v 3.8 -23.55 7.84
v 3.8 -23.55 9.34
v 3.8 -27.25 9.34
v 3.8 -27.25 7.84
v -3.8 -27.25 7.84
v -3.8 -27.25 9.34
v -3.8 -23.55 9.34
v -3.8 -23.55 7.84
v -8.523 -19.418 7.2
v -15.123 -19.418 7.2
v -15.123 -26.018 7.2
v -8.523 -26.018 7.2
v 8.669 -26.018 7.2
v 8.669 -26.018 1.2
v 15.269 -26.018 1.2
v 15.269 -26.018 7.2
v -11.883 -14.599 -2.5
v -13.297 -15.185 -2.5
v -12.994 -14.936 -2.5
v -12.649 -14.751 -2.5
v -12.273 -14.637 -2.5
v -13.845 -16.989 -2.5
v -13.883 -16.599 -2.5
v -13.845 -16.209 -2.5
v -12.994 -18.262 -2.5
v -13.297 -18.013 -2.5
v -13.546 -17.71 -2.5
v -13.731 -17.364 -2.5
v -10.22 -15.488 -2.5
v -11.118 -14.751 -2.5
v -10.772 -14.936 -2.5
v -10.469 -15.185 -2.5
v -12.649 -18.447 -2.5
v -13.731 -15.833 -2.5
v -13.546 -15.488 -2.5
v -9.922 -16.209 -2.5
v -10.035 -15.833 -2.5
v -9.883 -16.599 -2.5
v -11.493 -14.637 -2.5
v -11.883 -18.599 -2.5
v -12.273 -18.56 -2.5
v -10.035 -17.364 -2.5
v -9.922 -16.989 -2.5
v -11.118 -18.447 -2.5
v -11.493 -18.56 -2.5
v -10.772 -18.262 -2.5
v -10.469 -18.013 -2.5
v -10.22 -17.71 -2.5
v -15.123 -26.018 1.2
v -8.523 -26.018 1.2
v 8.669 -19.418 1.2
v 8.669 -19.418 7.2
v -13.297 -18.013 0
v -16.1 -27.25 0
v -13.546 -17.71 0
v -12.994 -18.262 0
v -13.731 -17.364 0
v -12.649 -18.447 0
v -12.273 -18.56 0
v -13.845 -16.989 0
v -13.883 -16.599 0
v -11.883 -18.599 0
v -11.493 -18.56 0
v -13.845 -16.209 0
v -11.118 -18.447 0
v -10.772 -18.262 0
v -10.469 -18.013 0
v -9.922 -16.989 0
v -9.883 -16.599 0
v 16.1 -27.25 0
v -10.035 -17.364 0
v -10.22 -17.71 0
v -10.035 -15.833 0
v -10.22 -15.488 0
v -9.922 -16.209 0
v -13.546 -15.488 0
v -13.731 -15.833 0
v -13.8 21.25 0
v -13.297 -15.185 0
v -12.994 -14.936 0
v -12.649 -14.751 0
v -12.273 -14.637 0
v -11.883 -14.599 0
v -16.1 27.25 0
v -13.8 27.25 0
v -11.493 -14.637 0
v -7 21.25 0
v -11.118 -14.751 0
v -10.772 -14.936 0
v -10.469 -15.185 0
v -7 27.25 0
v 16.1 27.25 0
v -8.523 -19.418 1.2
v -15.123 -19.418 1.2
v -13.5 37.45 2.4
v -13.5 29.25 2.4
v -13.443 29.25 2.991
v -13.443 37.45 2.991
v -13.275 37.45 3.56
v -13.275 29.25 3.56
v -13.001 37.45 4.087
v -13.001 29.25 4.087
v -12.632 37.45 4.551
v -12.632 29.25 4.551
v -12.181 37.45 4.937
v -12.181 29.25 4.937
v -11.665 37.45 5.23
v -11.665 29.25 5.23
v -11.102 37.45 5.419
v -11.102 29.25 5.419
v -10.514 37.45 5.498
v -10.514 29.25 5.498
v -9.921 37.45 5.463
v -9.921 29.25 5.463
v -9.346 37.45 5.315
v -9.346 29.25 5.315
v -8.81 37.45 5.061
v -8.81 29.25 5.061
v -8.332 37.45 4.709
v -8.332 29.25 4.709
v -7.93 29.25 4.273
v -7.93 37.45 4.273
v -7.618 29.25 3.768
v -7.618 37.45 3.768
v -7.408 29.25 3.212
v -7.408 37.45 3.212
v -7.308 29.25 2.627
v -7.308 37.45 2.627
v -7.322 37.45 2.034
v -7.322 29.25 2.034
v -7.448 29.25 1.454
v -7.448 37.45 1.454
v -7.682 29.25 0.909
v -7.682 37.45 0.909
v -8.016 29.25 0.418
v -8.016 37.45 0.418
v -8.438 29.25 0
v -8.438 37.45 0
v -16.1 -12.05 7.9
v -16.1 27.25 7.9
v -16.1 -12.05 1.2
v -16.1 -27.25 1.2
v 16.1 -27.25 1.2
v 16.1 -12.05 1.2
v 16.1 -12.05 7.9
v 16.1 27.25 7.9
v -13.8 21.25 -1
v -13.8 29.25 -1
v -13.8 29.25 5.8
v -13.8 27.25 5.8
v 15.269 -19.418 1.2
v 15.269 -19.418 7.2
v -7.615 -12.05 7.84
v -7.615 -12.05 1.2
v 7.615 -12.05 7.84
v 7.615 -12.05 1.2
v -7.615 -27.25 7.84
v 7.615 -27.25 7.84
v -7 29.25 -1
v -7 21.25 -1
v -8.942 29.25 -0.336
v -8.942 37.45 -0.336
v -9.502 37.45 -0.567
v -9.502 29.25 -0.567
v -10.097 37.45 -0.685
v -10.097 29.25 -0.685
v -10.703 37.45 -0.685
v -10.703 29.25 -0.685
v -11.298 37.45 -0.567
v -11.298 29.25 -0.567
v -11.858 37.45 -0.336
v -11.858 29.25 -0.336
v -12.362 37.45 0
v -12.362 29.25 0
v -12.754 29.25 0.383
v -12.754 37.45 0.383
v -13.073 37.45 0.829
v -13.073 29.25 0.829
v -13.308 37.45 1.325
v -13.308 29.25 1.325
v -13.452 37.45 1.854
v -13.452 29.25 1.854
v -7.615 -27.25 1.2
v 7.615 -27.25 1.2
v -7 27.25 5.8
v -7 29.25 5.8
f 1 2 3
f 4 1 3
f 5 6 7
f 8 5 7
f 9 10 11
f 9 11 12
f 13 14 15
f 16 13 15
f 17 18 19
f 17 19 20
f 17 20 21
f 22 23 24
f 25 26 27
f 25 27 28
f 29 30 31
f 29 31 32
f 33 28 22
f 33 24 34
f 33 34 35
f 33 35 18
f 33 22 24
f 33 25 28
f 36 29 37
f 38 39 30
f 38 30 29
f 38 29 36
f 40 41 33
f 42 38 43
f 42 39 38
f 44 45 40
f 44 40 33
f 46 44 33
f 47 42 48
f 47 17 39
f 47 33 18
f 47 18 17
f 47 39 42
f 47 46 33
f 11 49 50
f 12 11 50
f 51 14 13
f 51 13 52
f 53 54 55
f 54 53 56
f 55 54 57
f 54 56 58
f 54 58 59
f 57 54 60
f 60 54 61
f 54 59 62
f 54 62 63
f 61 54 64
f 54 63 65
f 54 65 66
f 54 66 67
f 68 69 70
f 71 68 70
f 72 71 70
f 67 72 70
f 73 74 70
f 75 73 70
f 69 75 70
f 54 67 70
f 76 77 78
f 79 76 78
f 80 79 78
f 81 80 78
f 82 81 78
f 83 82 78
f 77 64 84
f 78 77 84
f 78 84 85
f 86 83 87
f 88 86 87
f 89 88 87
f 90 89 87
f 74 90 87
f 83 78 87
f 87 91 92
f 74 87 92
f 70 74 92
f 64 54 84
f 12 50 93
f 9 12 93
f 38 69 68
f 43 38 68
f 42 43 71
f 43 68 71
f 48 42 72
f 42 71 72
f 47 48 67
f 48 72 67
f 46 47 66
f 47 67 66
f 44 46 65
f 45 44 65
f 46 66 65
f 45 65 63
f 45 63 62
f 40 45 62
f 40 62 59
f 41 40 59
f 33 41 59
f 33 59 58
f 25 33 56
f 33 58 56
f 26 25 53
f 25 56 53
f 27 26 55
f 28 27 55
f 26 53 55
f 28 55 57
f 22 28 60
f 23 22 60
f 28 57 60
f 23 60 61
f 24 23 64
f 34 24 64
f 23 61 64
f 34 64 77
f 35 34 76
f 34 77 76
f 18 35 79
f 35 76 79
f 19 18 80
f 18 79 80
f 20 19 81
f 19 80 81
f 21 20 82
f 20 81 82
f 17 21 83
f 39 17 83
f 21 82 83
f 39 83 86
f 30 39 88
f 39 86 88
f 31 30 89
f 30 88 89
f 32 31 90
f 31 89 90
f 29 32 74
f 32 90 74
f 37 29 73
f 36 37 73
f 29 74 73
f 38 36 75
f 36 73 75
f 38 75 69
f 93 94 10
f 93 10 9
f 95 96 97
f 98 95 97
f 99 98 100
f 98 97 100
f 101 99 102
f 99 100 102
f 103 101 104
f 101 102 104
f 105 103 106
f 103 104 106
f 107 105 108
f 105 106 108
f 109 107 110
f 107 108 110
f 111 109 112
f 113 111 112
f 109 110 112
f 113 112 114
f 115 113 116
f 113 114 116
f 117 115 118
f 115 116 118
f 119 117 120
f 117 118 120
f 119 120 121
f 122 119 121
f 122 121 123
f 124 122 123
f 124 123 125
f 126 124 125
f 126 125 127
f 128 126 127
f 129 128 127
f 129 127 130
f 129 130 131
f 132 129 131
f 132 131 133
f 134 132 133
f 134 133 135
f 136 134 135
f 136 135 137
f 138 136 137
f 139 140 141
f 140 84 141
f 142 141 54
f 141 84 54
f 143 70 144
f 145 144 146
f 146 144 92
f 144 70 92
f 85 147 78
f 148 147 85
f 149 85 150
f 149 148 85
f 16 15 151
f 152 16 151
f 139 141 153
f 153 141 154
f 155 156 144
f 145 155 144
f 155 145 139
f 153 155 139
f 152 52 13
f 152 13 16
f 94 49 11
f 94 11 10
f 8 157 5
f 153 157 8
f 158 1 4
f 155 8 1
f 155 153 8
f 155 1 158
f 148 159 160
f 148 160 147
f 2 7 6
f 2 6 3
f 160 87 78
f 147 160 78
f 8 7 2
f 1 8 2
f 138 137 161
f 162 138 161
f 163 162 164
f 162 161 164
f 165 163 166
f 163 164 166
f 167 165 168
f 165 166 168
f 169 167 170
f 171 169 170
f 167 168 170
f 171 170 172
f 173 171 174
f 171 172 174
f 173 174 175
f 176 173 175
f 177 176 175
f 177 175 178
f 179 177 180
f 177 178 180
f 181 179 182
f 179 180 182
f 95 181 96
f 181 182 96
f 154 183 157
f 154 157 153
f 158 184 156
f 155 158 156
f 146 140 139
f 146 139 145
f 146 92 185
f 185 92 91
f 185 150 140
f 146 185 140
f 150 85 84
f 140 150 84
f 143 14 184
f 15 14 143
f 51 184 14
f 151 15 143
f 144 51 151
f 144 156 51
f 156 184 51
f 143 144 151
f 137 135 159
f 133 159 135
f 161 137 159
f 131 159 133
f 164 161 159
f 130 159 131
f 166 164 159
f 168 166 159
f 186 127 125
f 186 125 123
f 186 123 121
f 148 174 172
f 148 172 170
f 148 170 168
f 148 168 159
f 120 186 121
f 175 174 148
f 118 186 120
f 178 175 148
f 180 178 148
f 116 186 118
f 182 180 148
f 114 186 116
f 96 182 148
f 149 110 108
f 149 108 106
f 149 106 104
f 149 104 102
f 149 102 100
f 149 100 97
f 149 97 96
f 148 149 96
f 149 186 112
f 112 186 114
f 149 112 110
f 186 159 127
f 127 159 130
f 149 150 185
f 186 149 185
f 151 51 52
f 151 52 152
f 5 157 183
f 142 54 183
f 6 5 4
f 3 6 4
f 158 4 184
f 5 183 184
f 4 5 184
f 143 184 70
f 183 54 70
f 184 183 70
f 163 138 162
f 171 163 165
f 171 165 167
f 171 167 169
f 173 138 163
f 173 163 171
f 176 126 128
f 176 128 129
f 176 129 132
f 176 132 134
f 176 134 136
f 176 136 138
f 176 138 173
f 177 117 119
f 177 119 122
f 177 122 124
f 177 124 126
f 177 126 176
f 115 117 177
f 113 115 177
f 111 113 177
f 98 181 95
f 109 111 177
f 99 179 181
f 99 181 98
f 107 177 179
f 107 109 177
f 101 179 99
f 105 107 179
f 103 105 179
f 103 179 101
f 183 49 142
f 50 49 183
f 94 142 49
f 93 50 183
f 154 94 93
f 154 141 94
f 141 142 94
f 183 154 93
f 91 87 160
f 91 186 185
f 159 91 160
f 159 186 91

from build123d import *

# Parameters (mm, degrees)
F0_W      = 32.2
F0_H      = 54.5
F1_DEPTH  = 1.2
F3_DEPTH  = 6.7
F2_W      = 15.23
F2_H      = 15.2
F4_DEPTH  = 8.14
F2_W_2    = 6.6
F2_H_2    = 6.6
F5_DEPTH  = 6
F6_R      = 2
F7_DEPTH  = 2.5
F9_DEPTH  = 10.2
F10_DEPTH = 2
F11_DEPTH = 6
F13_DEPTH = 1.5


with BuildPart() as f1:
    # F0 (on Top) → F1 (new body)
    with BuildSketch(Plane.XY):
        Rectangle(F0_W, F0_H)
    extrude(amount=F1_DEPTH)

    # F2 (on face) → F3 (join)
    with BuildSketch(Plane.XY.offset(1.2)):
        Polygon((-7.615, -12.05), (7.615, -12.05), (16.1, -12.05), (16.1, 27.25), (-16.1, 27.25), (-16.1, -12.05), align=None)
    extrude(amount=F3_DEPTH)

    # F2 (on face) → F4 (join)
    with BuildSketch(Plane.XY.offset(1.2)):
        with Locations((0, -19.65)):
            Rectangle(F2_W, F2_H)
    extrude(amount=F4_DEPTH)

    # F2 (on face) → F5 (join)
    with BuildSketch(Plane.XY.offset(1.2)):
        with Locations((-11.8228513747, -22.7176826447)):
            Rectangle(F2_W_2, F2_H_2)
        with Locations((11.9689786807, -22.7176826447)):
            Rectangle(F2_W_2, F2_H_2)
    extrude(amount=F5_DEPTH)

    # F6 (on face) → F7 (join)
    with BuildSketch(Plane(origin=(0, 0, 0), x_dir=(1, 0, 0), z_dir=(0, 0, -1))):
        with Locations((-11.8832346052, 16.5988039225)):
            Circle(F6_R)
    extrude(amount=F7_DEPTH)

    # F8 (on face) → F9 (join)
    with BuildSketch(Plane(origin=(0, 27.25, 0), x_dir=(-1, 0, 0), z_dir=(0, 1, 0))):
        with BuildLine():
            ThreePointArc((13.5, 2.4), (9.0719637109, 5.2011282753), (8.437858313, 0))
            Line((8.437858313, 0), (12.362141687, 0))
            ThreePointArc((12.362141687, 0), (13.2011282753, 1.0719637109), (13.5, 2.4))
        make_face()
        with BuildLine():
            Line((12.362141687, 0), (8.437858313, 0))
            ThreePointArc((8.437858313, 0), (10.4, -0.7), (12.362141687, 0))
        make_face()
    extrude(amount=F9_DEPTH)

    # F8 (on face) → F10 (join)
    with BuildSketch(Plane(origin=(0, 27.25, 0), x_dir=(-1, 0, 0), z_dir=(0, 1, 0))):
        with BuildLine():
            Line((8.437858313, 0), (7, 0))
            Line((7, 0), (7, -1))
            Line((7, -1), (13.8, -1))
            Line((13.8, -1), (13.8, 0))
            Line((13.8, 0), (12.362141687, 0))
            ThreePointArc((12.362141687, 0), (10.4, -0.7), (8.437858313, 0))
        make_face()
        with BuildLine():
            Line((13.8, 5.8), (7, 5.8))
            Line((7, 5.8), (7, 0))
            Line((7, 0), (8.437858313, 0))
            ThreePointArc((8.437858313, 0), (9.0719637109, 5.2011282753), (13.5, 2.4))
            ThreePointArc((13.5, 2.4), (13.2011282753, 1.0719637109), (12.362141687, 0))
            Line((12.362141687, 0), (13.8, 0))
            Line((13.8, 0), (13.8, 5.8))
        make_face()
    extrude(amount=F10_DEPTH)

    # F8 (on face) → F11 (join)
    with BuildSketch(Plane(origin=(0, 27.25, 0), x_dir=(-1, 0, 0), z_dir=(0, 1, 0))):
        with BuildLine():
            Line((8.437858313, 0), (7, 0))
            Line((7, 0), (7, -1))
            Line((7, -1), (13.8, -1))
            Line((13.8, -1), (13.8, 0))
            Line((13.8, 0), (12.362141687, 0))
            ThreePointArc((12.362141687, 0), (10.4, -0.7), (8.437858313, 0))
        make_face()
        with BuildLine():
            Line((12.362141687, 0), (8.437858313, 0))
            ThreePointArc((8.437858313, 0), (10.4, -0.7), (12.362141687, 0))
        make_face()
    extrude(amount=-F11_DEPTH)

    # F12 (on face) → F13 (cut)
    with BuildSketch(Plane.XY.offset(9.34)):
        Polygon((-7.615, -27.25), (-3.8, -27.25), (-3.8, -23.55), (3.8, -23.55), (3.8, -27.25), (7.615, -27.25), (7.615, -12.05), (-7.615, -12.05), align=None)
    extrude(amount=-F13_DEPTH, mode=Mode.SUBTRACT)


solid = f1.part
